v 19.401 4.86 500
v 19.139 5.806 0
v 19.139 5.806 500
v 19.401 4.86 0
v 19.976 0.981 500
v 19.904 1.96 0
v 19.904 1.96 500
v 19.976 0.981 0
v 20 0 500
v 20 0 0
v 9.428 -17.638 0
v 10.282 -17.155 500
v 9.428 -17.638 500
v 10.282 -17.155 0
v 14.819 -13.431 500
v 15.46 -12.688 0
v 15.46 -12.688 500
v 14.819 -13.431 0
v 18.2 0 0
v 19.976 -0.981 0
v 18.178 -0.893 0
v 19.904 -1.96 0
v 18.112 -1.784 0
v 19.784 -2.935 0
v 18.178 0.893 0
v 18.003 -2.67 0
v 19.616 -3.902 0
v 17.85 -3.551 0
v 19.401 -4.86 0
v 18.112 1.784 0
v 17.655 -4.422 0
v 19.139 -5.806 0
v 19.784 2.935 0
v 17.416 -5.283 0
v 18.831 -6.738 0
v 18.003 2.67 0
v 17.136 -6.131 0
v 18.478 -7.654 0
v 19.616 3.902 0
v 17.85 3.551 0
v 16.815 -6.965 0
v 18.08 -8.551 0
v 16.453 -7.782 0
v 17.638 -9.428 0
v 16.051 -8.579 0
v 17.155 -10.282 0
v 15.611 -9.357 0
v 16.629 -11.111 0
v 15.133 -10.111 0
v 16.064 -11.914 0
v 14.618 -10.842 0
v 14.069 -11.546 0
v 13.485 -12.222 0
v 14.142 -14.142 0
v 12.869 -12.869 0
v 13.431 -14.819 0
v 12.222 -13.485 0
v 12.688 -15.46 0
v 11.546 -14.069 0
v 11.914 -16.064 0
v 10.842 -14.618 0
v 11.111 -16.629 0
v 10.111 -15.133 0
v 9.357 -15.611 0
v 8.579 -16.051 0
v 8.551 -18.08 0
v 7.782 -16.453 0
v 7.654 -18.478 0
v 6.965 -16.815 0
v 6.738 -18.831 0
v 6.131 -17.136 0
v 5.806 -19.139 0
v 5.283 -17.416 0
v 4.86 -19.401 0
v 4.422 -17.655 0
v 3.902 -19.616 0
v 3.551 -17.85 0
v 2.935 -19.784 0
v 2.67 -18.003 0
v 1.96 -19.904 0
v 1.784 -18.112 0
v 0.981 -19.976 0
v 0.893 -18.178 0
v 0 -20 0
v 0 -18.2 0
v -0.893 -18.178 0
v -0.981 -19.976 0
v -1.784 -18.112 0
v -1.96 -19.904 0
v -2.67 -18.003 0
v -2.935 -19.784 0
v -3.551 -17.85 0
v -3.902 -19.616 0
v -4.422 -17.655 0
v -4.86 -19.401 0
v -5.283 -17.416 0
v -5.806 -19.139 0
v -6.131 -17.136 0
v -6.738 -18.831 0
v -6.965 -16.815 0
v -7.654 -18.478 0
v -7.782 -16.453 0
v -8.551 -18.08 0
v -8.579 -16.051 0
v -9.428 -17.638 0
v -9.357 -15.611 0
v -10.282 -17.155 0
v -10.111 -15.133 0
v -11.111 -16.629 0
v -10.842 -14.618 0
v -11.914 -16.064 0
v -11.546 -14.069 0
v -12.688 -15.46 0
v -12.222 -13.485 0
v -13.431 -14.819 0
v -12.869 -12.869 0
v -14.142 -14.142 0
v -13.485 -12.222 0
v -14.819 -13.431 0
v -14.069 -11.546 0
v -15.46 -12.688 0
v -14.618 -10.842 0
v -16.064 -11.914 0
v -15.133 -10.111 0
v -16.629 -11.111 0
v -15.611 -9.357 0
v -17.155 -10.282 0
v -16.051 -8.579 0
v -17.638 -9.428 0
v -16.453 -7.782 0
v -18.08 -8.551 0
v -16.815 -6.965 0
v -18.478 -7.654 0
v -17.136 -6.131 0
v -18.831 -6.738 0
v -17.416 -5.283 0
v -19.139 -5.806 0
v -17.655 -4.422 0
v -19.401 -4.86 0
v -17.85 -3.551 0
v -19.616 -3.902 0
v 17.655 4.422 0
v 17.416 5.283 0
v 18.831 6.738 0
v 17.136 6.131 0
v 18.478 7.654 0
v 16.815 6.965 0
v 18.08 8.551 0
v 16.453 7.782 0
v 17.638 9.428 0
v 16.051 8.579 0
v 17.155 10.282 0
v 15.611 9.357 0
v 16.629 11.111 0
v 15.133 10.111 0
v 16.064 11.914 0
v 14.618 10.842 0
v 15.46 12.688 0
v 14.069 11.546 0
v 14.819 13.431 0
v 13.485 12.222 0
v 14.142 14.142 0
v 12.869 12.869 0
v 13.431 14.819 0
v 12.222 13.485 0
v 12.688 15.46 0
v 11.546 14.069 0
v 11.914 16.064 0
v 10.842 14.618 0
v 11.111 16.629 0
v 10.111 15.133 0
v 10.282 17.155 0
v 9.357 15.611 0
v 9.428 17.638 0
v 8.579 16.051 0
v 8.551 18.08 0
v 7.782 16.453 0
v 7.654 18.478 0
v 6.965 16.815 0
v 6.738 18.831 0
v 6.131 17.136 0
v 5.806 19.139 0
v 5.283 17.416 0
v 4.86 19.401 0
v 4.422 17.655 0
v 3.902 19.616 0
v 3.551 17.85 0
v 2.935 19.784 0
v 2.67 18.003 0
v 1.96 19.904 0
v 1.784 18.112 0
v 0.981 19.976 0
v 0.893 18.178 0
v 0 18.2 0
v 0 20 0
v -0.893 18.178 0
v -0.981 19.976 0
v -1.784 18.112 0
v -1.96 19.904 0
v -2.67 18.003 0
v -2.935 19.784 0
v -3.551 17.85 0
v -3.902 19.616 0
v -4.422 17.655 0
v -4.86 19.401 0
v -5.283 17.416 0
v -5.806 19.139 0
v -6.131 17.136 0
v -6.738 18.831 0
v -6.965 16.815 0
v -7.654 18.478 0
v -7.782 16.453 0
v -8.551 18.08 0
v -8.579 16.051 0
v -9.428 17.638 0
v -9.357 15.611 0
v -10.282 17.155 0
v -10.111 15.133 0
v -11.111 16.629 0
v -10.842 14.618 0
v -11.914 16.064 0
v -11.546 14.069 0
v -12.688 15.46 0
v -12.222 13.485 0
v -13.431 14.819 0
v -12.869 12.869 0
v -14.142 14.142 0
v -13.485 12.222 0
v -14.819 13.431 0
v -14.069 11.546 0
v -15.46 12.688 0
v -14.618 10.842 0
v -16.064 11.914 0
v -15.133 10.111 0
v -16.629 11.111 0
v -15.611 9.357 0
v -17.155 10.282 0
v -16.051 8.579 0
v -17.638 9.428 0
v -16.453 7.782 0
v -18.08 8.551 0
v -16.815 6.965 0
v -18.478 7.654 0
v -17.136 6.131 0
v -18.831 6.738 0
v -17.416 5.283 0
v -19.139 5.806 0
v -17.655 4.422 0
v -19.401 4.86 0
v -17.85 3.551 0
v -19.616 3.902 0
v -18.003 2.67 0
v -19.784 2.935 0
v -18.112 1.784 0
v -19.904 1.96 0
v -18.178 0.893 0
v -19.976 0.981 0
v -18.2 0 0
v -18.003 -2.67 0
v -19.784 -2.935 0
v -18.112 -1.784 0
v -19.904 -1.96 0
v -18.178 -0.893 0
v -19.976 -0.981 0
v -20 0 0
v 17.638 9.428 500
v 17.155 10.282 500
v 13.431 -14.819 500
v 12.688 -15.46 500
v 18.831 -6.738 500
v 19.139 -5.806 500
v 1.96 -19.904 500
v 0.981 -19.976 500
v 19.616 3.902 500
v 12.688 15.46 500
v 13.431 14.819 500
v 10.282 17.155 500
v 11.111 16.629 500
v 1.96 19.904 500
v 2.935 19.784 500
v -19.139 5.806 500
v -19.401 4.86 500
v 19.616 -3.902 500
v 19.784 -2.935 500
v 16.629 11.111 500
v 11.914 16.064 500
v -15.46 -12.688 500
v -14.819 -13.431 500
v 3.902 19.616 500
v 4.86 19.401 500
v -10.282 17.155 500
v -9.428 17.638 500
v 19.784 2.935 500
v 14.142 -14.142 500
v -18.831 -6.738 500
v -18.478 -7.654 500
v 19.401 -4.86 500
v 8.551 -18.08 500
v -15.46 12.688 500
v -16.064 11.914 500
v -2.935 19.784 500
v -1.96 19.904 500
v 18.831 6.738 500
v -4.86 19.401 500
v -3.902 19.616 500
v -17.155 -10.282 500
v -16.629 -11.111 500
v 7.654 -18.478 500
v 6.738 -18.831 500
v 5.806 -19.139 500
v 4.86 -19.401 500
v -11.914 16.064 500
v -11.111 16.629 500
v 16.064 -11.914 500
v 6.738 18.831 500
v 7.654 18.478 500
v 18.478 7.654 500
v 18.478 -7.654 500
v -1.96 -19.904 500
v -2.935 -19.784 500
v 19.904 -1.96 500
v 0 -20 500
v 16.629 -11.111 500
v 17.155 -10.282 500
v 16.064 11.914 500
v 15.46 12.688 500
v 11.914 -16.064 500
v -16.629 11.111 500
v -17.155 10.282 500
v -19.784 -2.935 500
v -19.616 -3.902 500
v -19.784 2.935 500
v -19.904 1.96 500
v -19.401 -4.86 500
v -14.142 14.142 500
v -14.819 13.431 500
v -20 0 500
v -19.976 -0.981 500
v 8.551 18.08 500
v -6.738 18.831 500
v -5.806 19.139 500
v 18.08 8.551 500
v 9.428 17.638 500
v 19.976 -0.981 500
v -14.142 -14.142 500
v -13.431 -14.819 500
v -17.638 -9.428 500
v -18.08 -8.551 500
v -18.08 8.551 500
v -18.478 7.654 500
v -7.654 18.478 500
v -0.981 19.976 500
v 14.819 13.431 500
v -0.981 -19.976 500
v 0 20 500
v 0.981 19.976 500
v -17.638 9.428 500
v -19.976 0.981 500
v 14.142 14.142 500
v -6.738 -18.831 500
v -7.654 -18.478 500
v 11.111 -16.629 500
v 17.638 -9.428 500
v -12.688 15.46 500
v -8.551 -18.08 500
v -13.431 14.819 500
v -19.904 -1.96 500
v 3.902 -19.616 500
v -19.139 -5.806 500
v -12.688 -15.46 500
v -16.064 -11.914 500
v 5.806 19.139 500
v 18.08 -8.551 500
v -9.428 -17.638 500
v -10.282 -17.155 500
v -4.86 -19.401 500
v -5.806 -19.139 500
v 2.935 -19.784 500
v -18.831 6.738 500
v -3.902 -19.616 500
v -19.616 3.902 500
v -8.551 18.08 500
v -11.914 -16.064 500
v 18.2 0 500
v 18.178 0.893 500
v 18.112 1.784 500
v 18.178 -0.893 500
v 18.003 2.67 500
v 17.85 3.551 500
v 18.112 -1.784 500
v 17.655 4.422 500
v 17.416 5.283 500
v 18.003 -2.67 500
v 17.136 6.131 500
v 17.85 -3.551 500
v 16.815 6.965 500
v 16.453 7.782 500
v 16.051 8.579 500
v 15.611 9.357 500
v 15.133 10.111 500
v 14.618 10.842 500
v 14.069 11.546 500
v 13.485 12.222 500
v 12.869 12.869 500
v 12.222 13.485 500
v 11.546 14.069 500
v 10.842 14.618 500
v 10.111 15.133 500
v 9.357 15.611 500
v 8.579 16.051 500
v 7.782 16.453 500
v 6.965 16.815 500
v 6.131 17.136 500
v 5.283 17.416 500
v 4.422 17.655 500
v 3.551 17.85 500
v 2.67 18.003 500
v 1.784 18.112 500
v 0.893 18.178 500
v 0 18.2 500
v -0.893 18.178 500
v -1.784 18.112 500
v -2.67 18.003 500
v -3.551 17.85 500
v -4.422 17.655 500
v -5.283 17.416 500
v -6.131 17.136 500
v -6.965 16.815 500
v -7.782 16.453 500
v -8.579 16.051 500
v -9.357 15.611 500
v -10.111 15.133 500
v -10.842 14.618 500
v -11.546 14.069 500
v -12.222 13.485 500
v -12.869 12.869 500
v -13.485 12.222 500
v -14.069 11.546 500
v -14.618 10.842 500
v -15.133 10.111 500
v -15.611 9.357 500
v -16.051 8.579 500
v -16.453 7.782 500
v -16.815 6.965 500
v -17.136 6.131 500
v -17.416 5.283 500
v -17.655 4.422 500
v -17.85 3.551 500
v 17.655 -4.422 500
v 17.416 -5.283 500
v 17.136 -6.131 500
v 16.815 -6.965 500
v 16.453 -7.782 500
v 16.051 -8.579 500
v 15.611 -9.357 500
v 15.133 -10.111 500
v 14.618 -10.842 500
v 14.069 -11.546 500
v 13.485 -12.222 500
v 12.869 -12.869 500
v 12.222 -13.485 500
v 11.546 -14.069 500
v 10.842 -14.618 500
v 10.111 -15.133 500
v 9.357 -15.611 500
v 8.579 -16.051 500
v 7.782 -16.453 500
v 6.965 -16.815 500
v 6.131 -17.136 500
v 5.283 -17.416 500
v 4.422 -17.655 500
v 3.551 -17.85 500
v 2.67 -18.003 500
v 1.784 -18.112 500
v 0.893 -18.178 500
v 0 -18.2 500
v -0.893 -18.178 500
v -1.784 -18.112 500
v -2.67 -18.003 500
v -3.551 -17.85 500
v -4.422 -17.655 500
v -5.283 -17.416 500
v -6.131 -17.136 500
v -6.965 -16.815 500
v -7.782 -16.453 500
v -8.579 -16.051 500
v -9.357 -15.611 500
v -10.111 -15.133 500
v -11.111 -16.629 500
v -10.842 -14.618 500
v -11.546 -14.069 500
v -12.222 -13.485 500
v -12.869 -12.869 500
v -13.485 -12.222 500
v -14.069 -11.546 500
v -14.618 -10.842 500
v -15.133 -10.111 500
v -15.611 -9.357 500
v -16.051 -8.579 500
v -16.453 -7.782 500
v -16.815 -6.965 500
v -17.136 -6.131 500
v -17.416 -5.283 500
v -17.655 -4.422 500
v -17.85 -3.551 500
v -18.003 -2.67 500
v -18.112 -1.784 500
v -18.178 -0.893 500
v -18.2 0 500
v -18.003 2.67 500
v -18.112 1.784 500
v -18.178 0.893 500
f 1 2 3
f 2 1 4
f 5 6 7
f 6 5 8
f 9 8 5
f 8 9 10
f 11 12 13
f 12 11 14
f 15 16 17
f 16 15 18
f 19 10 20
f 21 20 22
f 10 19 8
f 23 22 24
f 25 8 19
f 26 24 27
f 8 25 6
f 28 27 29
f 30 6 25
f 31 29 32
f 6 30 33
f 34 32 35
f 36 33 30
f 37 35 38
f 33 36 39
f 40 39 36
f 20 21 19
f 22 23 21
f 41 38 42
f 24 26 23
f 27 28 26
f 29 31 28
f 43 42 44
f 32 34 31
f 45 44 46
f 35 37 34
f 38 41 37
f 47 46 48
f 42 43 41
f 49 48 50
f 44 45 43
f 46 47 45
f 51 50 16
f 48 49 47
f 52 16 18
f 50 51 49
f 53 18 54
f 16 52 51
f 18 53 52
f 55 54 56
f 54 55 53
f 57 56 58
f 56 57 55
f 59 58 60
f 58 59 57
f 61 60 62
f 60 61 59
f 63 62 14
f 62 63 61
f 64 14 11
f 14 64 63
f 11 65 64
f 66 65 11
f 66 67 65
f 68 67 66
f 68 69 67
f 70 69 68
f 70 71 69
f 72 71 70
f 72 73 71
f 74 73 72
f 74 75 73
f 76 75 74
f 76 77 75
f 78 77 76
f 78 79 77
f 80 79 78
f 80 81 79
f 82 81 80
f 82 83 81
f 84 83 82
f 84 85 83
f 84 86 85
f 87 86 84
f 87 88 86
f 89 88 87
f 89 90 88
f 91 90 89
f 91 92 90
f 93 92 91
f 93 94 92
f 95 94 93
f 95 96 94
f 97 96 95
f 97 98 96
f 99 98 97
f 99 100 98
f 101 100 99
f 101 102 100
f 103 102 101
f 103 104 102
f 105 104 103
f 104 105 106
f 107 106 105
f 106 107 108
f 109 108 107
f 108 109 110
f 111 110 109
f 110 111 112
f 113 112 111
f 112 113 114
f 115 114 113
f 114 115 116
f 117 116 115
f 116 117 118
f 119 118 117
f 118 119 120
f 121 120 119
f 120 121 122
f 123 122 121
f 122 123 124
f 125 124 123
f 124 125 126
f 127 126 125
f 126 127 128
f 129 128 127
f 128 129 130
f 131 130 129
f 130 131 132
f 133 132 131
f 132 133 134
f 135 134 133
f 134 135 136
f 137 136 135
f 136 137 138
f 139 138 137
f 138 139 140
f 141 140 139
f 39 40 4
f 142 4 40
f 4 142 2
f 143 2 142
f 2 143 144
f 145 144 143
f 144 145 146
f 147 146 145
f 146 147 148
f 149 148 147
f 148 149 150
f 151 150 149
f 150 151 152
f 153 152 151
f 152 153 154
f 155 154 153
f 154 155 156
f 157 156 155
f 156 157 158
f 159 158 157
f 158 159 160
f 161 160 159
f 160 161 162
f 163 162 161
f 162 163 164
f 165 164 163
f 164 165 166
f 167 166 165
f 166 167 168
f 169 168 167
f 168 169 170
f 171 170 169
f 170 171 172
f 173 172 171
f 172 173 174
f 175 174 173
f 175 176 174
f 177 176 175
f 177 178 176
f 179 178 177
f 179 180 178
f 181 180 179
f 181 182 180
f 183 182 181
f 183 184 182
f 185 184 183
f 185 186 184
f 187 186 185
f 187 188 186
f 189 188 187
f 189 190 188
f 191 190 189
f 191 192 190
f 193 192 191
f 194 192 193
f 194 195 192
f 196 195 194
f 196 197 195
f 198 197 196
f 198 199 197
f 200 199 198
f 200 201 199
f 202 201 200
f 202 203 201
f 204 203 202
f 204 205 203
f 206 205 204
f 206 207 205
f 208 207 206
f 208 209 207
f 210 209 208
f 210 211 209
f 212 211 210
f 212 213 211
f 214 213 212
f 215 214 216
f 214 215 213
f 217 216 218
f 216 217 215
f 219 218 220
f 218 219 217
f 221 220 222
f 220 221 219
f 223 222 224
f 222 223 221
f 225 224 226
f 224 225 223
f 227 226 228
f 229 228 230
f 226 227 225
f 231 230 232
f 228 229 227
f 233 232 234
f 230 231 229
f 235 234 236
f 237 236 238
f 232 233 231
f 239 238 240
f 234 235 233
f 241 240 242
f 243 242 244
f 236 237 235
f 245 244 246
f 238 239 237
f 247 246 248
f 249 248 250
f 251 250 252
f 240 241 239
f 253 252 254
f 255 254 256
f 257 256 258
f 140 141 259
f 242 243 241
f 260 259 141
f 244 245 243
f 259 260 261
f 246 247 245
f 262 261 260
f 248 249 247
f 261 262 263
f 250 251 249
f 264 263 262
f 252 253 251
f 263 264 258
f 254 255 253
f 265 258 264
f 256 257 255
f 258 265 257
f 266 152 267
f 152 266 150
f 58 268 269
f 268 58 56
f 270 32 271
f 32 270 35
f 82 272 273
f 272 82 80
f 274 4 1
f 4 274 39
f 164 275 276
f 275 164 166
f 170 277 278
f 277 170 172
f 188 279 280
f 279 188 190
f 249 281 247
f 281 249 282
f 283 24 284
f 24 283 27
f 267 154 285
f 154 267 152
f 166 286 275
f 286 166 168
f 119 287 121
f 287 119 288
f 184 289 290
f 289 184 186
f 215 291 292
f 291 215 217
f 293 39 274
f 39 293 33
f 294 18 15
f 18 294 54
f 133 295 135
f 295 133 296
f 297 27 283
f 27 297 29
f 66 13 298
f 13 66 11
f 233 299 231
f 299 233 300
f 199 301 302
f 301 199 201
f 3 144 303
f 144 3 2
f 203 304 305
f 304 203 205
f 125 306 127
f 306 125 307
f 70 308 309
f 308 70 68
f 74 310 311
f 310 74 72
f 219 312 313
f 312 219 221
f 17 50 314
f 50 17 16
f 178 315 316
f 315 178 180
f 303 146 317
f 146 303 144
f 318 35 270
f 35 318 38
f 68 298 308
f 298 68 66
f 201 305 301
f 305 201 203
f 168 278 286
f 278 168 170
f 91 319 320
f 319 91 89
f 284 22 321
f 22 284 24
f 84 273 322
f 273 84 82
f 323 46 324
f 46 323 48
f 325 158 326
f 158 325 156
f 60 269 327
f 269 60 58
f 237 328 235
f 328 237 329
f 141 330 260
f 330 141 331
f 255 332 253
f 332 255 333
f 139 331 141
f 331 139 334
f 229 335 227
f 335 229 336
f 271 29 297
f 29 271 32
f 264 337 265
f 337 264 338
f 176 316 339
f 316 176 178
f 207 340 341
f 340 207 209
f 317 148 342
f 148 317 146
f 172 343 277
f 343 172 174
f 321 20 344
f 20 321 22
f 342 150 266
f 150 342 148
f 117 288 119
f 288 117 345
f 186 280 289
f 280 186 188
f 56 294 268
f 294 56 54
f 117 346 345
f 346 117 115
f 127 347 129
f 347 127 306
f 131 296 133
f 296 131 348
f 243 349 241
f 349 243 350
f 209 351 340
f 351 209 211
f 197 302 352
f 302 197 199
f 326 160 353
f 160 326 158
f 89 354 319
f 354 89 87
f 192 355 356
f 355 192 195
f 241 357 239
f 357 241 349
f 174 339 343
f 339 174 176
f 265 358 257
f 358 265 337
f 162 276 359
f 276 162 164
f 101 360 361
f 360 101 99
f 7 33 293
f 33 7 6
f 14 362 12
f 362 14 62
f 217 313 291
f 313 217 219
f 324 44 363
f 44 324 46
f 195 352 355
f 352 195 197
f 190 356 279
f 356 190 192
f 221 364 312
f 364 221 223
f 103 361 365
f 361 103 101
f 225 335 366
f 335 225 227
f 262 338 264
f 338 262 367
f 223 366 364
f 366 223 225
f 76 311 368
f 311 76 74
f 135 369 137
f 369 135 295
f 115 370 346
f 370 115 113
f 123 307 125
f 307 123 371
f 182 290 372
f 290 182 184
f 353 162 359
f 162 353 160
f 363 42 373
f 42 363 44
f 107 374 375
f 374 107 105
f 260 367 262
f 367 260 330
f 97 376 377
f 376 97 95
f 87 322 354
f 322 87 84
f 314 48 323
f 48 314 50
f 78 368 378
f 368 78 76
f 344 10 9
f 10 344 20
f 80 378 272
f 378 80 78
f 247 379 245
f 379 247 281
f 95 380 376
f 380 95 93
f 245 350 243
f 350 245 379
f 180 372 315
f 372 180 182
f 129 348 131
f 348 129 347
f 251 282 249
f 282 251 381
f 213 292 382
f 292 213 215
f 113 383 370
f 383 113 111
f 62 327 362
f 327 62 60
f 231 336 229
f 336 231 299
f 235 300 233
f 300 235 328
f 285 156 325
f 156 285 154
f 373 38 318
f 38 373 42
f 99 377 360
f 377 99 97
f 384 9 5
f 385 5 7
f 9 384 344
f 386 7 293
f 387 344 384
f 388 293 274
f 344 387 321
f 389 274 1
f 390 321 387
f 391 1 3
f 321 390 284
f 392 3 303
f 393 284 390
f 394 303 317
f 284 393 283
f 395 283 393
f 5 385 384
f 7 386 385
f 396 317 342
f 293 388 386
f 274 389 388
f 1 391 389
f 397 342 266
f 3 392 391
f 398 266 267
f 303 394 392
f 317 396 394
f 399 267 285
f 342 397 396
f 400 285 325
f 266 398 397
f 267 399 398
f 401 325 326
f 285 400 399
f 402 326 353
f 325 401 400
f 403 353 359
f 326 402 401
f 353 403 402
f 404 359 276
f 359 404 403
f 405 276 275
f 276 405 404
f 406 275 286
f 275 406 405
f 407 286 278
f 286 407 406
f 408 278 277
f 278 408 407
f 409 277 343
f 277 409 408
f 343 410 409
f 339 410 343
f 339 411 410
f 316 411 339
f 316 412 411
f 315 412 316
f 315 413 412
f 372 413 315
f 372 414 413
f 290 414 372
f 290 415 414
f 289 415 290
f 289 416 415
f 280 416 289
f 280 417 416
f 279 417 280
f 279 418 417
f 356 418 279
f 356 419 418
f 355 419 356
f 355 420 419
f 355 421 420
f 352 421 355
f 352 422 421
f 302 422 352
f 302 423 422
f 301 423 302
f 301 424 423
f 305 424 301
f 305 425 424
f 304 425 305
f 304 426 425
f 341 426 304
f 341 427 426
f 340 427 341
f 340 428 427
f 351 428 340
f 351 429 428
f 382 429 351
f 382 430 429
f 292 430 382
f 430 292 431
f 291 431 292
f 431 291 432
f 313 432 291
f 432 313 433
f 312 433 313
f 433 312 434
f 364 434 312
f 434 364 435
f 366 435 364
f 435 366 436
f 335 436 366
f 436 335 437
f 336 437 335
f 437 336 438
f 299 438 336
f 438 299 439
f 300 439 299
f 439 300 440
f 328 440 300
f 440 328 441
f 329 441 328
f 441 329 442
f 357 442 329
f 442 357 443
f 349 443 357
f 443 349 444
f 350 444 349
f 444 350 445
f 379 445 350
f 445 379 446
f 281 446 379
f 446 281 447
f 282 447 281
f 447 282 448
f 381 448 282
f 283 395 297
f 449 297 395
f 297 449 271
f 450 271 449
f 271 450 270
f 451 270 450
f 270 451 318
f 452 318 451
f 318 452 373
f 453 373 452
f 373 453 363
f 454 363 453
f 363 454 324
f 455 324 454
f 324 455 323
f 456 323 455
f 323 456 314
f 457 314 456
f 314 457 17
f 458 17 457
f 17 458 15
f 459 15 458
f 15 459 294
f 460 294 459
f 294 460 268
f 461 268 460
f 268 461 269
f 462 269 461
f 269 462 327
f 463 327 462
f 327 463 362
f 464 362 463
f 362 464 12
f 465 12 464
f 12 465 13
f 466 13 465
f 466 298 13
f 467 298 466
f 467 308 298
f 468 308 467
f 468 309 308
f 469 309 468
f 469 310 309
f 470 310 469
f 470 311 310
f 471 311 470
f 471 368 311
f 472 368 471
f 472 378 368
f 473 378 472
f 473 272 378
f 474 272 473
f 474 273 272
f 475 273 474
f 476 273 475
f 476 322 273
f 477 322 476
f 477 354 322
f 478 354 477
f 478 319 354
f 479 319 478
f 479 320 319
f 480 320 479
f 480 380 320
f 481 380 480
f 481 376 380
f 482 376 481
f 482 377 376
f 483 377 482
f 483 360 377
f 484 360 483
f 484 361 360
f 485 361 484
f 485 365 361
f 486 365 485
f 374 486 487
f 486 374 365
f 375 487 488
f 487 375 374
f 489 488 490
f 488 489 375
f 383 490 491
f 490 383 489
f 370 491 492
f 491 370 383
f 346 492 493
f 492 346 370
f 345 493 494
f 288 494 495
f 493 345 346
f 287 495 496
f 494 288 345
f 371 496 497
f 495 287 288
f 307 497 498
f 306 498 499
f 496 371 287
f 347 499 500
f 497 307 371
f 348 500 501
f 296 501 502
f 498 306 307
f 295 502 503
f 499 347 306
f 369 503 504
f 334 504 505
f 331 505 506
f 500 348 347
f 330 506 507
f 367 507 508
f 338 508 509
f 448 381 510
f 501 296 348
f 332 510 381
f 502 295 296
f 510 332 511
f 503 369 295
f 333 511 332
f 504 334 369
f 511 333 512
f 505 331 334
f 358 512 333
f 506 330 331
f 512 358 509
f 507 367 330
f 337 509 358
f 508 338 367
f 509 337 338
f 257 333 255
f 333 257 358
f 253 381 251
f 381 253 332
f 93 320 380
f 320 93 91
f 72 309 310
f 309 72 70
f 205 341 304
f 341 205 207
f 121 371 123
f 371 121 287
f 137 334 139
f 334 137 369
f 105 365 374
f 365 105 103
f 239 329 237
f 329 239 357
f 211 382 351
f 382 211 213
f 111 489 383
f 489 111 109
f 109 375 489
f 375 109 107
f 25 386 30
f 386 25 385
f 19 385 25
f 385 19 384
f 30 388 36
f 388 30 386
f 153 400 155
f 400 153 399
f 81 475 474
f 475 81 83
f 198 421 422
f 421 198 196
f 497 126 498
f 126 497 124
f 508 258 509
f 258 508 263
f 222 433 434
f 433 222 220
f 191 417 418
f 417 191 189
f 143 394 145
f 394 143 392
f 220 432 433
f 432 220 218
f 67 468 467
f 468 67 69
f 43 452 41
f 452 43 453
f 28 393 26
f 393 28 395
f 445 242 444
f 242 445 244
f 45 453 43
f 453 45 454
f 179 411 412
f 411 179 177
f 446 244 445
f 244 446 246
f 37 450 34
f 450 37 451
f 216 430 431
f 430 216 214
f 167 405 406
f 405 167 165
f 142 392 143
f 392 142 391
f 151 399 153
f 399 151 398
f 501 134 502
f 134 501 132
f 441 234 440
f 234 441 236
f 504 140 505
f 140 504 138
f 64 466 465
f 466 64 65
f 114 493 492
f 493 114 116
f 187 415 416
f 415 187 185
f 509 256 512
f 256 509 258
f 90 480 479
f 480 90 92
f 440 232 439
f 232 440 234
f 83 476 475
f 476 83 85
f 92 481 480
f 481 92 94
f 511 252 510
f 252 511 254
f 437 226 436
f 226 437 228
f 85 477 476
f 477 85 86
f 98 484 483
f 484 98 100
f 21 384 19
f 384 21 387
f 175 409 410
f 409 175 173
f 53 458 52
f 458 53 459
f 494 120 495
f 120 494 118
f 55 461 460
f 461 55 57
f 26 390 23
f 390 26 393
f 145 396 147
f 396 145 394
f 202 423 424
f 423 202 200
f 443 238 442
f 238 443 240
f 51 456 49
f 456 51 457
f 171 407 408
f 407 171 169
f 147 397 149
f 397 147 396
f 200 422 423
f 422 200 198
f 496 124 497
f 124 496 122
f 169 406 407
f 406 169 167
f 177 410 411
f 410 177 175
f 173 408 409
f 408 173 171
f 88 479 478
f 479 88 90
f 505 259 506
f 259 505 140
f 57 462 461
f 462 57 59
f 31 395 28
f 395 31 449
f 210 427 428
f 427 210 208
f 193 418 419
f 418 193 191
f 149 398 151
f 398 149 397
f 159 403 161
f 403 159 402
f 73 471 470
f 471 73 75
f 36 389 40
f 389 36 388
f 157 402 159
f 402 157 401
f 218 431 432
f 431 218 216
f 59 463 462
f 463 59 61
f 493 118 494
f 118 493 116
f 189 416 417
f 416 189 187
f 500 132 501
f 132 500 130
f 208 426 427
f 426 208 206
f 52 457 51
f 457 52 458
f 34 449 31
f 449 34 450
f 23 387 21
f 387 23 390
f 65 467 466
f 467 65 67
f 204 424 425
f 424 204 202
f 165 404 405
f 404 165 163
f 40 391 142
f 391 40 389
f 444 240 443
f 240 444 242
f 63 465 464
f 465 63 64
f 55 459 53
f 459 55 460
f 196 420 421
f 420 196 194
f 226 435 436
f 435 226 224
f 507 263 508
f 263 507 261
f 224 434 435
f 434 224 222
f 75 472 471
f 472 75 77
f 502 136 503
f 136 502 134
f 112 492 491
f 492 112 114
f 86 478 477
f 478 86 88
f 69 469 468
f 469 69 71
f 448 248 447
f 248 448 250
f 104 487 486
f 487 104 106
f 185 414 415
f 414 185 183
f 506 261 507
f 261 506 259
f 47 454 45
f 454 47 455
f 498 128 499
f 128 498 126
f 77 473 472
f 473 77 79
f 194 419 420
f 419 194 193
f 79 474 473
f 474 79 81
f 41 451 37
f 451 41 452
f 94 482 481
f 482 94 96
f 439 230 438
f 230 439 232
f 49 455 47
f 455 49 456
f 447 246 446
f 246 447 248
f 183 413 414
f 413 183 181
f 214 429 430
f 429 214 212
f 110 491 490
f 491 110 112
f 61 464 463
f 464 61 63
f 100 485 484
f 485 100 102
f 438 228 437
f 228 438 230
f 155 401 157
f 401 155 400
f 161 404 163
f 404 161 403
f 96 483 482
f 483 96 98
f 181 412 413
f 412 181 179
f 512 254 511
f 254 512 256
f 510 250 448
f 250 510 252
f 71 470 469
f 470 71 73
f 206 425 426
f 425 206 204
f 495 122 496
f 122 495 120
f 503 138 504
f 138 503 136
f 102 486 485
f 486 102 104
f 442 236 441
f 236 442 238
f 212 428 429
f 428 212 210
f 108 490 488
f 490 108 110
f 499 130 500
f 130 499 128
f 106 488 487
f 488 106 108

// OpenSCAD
$fn = 128;

// HT pipe parameters (approximate for HT 40)
pipe_length = 500;          // mm
outer_diameter = 40;        // mm (nominal)
wall_thickness = 1.8;       // mm (typical HT pipe wall)
inner_diameter = outer_diameter - 2 * wall_thickness;

module ht_pipe(od=40, id=36.4, L=500) {
    difference() {
        cylinder(h=L, d=od, center=false);
        translate([0,0,-0.5])
            cylinder(h=L+1, d=id, center=false);
    }
}

ht_pipe(outer_diameter, inner_diameter, pipe_length);
